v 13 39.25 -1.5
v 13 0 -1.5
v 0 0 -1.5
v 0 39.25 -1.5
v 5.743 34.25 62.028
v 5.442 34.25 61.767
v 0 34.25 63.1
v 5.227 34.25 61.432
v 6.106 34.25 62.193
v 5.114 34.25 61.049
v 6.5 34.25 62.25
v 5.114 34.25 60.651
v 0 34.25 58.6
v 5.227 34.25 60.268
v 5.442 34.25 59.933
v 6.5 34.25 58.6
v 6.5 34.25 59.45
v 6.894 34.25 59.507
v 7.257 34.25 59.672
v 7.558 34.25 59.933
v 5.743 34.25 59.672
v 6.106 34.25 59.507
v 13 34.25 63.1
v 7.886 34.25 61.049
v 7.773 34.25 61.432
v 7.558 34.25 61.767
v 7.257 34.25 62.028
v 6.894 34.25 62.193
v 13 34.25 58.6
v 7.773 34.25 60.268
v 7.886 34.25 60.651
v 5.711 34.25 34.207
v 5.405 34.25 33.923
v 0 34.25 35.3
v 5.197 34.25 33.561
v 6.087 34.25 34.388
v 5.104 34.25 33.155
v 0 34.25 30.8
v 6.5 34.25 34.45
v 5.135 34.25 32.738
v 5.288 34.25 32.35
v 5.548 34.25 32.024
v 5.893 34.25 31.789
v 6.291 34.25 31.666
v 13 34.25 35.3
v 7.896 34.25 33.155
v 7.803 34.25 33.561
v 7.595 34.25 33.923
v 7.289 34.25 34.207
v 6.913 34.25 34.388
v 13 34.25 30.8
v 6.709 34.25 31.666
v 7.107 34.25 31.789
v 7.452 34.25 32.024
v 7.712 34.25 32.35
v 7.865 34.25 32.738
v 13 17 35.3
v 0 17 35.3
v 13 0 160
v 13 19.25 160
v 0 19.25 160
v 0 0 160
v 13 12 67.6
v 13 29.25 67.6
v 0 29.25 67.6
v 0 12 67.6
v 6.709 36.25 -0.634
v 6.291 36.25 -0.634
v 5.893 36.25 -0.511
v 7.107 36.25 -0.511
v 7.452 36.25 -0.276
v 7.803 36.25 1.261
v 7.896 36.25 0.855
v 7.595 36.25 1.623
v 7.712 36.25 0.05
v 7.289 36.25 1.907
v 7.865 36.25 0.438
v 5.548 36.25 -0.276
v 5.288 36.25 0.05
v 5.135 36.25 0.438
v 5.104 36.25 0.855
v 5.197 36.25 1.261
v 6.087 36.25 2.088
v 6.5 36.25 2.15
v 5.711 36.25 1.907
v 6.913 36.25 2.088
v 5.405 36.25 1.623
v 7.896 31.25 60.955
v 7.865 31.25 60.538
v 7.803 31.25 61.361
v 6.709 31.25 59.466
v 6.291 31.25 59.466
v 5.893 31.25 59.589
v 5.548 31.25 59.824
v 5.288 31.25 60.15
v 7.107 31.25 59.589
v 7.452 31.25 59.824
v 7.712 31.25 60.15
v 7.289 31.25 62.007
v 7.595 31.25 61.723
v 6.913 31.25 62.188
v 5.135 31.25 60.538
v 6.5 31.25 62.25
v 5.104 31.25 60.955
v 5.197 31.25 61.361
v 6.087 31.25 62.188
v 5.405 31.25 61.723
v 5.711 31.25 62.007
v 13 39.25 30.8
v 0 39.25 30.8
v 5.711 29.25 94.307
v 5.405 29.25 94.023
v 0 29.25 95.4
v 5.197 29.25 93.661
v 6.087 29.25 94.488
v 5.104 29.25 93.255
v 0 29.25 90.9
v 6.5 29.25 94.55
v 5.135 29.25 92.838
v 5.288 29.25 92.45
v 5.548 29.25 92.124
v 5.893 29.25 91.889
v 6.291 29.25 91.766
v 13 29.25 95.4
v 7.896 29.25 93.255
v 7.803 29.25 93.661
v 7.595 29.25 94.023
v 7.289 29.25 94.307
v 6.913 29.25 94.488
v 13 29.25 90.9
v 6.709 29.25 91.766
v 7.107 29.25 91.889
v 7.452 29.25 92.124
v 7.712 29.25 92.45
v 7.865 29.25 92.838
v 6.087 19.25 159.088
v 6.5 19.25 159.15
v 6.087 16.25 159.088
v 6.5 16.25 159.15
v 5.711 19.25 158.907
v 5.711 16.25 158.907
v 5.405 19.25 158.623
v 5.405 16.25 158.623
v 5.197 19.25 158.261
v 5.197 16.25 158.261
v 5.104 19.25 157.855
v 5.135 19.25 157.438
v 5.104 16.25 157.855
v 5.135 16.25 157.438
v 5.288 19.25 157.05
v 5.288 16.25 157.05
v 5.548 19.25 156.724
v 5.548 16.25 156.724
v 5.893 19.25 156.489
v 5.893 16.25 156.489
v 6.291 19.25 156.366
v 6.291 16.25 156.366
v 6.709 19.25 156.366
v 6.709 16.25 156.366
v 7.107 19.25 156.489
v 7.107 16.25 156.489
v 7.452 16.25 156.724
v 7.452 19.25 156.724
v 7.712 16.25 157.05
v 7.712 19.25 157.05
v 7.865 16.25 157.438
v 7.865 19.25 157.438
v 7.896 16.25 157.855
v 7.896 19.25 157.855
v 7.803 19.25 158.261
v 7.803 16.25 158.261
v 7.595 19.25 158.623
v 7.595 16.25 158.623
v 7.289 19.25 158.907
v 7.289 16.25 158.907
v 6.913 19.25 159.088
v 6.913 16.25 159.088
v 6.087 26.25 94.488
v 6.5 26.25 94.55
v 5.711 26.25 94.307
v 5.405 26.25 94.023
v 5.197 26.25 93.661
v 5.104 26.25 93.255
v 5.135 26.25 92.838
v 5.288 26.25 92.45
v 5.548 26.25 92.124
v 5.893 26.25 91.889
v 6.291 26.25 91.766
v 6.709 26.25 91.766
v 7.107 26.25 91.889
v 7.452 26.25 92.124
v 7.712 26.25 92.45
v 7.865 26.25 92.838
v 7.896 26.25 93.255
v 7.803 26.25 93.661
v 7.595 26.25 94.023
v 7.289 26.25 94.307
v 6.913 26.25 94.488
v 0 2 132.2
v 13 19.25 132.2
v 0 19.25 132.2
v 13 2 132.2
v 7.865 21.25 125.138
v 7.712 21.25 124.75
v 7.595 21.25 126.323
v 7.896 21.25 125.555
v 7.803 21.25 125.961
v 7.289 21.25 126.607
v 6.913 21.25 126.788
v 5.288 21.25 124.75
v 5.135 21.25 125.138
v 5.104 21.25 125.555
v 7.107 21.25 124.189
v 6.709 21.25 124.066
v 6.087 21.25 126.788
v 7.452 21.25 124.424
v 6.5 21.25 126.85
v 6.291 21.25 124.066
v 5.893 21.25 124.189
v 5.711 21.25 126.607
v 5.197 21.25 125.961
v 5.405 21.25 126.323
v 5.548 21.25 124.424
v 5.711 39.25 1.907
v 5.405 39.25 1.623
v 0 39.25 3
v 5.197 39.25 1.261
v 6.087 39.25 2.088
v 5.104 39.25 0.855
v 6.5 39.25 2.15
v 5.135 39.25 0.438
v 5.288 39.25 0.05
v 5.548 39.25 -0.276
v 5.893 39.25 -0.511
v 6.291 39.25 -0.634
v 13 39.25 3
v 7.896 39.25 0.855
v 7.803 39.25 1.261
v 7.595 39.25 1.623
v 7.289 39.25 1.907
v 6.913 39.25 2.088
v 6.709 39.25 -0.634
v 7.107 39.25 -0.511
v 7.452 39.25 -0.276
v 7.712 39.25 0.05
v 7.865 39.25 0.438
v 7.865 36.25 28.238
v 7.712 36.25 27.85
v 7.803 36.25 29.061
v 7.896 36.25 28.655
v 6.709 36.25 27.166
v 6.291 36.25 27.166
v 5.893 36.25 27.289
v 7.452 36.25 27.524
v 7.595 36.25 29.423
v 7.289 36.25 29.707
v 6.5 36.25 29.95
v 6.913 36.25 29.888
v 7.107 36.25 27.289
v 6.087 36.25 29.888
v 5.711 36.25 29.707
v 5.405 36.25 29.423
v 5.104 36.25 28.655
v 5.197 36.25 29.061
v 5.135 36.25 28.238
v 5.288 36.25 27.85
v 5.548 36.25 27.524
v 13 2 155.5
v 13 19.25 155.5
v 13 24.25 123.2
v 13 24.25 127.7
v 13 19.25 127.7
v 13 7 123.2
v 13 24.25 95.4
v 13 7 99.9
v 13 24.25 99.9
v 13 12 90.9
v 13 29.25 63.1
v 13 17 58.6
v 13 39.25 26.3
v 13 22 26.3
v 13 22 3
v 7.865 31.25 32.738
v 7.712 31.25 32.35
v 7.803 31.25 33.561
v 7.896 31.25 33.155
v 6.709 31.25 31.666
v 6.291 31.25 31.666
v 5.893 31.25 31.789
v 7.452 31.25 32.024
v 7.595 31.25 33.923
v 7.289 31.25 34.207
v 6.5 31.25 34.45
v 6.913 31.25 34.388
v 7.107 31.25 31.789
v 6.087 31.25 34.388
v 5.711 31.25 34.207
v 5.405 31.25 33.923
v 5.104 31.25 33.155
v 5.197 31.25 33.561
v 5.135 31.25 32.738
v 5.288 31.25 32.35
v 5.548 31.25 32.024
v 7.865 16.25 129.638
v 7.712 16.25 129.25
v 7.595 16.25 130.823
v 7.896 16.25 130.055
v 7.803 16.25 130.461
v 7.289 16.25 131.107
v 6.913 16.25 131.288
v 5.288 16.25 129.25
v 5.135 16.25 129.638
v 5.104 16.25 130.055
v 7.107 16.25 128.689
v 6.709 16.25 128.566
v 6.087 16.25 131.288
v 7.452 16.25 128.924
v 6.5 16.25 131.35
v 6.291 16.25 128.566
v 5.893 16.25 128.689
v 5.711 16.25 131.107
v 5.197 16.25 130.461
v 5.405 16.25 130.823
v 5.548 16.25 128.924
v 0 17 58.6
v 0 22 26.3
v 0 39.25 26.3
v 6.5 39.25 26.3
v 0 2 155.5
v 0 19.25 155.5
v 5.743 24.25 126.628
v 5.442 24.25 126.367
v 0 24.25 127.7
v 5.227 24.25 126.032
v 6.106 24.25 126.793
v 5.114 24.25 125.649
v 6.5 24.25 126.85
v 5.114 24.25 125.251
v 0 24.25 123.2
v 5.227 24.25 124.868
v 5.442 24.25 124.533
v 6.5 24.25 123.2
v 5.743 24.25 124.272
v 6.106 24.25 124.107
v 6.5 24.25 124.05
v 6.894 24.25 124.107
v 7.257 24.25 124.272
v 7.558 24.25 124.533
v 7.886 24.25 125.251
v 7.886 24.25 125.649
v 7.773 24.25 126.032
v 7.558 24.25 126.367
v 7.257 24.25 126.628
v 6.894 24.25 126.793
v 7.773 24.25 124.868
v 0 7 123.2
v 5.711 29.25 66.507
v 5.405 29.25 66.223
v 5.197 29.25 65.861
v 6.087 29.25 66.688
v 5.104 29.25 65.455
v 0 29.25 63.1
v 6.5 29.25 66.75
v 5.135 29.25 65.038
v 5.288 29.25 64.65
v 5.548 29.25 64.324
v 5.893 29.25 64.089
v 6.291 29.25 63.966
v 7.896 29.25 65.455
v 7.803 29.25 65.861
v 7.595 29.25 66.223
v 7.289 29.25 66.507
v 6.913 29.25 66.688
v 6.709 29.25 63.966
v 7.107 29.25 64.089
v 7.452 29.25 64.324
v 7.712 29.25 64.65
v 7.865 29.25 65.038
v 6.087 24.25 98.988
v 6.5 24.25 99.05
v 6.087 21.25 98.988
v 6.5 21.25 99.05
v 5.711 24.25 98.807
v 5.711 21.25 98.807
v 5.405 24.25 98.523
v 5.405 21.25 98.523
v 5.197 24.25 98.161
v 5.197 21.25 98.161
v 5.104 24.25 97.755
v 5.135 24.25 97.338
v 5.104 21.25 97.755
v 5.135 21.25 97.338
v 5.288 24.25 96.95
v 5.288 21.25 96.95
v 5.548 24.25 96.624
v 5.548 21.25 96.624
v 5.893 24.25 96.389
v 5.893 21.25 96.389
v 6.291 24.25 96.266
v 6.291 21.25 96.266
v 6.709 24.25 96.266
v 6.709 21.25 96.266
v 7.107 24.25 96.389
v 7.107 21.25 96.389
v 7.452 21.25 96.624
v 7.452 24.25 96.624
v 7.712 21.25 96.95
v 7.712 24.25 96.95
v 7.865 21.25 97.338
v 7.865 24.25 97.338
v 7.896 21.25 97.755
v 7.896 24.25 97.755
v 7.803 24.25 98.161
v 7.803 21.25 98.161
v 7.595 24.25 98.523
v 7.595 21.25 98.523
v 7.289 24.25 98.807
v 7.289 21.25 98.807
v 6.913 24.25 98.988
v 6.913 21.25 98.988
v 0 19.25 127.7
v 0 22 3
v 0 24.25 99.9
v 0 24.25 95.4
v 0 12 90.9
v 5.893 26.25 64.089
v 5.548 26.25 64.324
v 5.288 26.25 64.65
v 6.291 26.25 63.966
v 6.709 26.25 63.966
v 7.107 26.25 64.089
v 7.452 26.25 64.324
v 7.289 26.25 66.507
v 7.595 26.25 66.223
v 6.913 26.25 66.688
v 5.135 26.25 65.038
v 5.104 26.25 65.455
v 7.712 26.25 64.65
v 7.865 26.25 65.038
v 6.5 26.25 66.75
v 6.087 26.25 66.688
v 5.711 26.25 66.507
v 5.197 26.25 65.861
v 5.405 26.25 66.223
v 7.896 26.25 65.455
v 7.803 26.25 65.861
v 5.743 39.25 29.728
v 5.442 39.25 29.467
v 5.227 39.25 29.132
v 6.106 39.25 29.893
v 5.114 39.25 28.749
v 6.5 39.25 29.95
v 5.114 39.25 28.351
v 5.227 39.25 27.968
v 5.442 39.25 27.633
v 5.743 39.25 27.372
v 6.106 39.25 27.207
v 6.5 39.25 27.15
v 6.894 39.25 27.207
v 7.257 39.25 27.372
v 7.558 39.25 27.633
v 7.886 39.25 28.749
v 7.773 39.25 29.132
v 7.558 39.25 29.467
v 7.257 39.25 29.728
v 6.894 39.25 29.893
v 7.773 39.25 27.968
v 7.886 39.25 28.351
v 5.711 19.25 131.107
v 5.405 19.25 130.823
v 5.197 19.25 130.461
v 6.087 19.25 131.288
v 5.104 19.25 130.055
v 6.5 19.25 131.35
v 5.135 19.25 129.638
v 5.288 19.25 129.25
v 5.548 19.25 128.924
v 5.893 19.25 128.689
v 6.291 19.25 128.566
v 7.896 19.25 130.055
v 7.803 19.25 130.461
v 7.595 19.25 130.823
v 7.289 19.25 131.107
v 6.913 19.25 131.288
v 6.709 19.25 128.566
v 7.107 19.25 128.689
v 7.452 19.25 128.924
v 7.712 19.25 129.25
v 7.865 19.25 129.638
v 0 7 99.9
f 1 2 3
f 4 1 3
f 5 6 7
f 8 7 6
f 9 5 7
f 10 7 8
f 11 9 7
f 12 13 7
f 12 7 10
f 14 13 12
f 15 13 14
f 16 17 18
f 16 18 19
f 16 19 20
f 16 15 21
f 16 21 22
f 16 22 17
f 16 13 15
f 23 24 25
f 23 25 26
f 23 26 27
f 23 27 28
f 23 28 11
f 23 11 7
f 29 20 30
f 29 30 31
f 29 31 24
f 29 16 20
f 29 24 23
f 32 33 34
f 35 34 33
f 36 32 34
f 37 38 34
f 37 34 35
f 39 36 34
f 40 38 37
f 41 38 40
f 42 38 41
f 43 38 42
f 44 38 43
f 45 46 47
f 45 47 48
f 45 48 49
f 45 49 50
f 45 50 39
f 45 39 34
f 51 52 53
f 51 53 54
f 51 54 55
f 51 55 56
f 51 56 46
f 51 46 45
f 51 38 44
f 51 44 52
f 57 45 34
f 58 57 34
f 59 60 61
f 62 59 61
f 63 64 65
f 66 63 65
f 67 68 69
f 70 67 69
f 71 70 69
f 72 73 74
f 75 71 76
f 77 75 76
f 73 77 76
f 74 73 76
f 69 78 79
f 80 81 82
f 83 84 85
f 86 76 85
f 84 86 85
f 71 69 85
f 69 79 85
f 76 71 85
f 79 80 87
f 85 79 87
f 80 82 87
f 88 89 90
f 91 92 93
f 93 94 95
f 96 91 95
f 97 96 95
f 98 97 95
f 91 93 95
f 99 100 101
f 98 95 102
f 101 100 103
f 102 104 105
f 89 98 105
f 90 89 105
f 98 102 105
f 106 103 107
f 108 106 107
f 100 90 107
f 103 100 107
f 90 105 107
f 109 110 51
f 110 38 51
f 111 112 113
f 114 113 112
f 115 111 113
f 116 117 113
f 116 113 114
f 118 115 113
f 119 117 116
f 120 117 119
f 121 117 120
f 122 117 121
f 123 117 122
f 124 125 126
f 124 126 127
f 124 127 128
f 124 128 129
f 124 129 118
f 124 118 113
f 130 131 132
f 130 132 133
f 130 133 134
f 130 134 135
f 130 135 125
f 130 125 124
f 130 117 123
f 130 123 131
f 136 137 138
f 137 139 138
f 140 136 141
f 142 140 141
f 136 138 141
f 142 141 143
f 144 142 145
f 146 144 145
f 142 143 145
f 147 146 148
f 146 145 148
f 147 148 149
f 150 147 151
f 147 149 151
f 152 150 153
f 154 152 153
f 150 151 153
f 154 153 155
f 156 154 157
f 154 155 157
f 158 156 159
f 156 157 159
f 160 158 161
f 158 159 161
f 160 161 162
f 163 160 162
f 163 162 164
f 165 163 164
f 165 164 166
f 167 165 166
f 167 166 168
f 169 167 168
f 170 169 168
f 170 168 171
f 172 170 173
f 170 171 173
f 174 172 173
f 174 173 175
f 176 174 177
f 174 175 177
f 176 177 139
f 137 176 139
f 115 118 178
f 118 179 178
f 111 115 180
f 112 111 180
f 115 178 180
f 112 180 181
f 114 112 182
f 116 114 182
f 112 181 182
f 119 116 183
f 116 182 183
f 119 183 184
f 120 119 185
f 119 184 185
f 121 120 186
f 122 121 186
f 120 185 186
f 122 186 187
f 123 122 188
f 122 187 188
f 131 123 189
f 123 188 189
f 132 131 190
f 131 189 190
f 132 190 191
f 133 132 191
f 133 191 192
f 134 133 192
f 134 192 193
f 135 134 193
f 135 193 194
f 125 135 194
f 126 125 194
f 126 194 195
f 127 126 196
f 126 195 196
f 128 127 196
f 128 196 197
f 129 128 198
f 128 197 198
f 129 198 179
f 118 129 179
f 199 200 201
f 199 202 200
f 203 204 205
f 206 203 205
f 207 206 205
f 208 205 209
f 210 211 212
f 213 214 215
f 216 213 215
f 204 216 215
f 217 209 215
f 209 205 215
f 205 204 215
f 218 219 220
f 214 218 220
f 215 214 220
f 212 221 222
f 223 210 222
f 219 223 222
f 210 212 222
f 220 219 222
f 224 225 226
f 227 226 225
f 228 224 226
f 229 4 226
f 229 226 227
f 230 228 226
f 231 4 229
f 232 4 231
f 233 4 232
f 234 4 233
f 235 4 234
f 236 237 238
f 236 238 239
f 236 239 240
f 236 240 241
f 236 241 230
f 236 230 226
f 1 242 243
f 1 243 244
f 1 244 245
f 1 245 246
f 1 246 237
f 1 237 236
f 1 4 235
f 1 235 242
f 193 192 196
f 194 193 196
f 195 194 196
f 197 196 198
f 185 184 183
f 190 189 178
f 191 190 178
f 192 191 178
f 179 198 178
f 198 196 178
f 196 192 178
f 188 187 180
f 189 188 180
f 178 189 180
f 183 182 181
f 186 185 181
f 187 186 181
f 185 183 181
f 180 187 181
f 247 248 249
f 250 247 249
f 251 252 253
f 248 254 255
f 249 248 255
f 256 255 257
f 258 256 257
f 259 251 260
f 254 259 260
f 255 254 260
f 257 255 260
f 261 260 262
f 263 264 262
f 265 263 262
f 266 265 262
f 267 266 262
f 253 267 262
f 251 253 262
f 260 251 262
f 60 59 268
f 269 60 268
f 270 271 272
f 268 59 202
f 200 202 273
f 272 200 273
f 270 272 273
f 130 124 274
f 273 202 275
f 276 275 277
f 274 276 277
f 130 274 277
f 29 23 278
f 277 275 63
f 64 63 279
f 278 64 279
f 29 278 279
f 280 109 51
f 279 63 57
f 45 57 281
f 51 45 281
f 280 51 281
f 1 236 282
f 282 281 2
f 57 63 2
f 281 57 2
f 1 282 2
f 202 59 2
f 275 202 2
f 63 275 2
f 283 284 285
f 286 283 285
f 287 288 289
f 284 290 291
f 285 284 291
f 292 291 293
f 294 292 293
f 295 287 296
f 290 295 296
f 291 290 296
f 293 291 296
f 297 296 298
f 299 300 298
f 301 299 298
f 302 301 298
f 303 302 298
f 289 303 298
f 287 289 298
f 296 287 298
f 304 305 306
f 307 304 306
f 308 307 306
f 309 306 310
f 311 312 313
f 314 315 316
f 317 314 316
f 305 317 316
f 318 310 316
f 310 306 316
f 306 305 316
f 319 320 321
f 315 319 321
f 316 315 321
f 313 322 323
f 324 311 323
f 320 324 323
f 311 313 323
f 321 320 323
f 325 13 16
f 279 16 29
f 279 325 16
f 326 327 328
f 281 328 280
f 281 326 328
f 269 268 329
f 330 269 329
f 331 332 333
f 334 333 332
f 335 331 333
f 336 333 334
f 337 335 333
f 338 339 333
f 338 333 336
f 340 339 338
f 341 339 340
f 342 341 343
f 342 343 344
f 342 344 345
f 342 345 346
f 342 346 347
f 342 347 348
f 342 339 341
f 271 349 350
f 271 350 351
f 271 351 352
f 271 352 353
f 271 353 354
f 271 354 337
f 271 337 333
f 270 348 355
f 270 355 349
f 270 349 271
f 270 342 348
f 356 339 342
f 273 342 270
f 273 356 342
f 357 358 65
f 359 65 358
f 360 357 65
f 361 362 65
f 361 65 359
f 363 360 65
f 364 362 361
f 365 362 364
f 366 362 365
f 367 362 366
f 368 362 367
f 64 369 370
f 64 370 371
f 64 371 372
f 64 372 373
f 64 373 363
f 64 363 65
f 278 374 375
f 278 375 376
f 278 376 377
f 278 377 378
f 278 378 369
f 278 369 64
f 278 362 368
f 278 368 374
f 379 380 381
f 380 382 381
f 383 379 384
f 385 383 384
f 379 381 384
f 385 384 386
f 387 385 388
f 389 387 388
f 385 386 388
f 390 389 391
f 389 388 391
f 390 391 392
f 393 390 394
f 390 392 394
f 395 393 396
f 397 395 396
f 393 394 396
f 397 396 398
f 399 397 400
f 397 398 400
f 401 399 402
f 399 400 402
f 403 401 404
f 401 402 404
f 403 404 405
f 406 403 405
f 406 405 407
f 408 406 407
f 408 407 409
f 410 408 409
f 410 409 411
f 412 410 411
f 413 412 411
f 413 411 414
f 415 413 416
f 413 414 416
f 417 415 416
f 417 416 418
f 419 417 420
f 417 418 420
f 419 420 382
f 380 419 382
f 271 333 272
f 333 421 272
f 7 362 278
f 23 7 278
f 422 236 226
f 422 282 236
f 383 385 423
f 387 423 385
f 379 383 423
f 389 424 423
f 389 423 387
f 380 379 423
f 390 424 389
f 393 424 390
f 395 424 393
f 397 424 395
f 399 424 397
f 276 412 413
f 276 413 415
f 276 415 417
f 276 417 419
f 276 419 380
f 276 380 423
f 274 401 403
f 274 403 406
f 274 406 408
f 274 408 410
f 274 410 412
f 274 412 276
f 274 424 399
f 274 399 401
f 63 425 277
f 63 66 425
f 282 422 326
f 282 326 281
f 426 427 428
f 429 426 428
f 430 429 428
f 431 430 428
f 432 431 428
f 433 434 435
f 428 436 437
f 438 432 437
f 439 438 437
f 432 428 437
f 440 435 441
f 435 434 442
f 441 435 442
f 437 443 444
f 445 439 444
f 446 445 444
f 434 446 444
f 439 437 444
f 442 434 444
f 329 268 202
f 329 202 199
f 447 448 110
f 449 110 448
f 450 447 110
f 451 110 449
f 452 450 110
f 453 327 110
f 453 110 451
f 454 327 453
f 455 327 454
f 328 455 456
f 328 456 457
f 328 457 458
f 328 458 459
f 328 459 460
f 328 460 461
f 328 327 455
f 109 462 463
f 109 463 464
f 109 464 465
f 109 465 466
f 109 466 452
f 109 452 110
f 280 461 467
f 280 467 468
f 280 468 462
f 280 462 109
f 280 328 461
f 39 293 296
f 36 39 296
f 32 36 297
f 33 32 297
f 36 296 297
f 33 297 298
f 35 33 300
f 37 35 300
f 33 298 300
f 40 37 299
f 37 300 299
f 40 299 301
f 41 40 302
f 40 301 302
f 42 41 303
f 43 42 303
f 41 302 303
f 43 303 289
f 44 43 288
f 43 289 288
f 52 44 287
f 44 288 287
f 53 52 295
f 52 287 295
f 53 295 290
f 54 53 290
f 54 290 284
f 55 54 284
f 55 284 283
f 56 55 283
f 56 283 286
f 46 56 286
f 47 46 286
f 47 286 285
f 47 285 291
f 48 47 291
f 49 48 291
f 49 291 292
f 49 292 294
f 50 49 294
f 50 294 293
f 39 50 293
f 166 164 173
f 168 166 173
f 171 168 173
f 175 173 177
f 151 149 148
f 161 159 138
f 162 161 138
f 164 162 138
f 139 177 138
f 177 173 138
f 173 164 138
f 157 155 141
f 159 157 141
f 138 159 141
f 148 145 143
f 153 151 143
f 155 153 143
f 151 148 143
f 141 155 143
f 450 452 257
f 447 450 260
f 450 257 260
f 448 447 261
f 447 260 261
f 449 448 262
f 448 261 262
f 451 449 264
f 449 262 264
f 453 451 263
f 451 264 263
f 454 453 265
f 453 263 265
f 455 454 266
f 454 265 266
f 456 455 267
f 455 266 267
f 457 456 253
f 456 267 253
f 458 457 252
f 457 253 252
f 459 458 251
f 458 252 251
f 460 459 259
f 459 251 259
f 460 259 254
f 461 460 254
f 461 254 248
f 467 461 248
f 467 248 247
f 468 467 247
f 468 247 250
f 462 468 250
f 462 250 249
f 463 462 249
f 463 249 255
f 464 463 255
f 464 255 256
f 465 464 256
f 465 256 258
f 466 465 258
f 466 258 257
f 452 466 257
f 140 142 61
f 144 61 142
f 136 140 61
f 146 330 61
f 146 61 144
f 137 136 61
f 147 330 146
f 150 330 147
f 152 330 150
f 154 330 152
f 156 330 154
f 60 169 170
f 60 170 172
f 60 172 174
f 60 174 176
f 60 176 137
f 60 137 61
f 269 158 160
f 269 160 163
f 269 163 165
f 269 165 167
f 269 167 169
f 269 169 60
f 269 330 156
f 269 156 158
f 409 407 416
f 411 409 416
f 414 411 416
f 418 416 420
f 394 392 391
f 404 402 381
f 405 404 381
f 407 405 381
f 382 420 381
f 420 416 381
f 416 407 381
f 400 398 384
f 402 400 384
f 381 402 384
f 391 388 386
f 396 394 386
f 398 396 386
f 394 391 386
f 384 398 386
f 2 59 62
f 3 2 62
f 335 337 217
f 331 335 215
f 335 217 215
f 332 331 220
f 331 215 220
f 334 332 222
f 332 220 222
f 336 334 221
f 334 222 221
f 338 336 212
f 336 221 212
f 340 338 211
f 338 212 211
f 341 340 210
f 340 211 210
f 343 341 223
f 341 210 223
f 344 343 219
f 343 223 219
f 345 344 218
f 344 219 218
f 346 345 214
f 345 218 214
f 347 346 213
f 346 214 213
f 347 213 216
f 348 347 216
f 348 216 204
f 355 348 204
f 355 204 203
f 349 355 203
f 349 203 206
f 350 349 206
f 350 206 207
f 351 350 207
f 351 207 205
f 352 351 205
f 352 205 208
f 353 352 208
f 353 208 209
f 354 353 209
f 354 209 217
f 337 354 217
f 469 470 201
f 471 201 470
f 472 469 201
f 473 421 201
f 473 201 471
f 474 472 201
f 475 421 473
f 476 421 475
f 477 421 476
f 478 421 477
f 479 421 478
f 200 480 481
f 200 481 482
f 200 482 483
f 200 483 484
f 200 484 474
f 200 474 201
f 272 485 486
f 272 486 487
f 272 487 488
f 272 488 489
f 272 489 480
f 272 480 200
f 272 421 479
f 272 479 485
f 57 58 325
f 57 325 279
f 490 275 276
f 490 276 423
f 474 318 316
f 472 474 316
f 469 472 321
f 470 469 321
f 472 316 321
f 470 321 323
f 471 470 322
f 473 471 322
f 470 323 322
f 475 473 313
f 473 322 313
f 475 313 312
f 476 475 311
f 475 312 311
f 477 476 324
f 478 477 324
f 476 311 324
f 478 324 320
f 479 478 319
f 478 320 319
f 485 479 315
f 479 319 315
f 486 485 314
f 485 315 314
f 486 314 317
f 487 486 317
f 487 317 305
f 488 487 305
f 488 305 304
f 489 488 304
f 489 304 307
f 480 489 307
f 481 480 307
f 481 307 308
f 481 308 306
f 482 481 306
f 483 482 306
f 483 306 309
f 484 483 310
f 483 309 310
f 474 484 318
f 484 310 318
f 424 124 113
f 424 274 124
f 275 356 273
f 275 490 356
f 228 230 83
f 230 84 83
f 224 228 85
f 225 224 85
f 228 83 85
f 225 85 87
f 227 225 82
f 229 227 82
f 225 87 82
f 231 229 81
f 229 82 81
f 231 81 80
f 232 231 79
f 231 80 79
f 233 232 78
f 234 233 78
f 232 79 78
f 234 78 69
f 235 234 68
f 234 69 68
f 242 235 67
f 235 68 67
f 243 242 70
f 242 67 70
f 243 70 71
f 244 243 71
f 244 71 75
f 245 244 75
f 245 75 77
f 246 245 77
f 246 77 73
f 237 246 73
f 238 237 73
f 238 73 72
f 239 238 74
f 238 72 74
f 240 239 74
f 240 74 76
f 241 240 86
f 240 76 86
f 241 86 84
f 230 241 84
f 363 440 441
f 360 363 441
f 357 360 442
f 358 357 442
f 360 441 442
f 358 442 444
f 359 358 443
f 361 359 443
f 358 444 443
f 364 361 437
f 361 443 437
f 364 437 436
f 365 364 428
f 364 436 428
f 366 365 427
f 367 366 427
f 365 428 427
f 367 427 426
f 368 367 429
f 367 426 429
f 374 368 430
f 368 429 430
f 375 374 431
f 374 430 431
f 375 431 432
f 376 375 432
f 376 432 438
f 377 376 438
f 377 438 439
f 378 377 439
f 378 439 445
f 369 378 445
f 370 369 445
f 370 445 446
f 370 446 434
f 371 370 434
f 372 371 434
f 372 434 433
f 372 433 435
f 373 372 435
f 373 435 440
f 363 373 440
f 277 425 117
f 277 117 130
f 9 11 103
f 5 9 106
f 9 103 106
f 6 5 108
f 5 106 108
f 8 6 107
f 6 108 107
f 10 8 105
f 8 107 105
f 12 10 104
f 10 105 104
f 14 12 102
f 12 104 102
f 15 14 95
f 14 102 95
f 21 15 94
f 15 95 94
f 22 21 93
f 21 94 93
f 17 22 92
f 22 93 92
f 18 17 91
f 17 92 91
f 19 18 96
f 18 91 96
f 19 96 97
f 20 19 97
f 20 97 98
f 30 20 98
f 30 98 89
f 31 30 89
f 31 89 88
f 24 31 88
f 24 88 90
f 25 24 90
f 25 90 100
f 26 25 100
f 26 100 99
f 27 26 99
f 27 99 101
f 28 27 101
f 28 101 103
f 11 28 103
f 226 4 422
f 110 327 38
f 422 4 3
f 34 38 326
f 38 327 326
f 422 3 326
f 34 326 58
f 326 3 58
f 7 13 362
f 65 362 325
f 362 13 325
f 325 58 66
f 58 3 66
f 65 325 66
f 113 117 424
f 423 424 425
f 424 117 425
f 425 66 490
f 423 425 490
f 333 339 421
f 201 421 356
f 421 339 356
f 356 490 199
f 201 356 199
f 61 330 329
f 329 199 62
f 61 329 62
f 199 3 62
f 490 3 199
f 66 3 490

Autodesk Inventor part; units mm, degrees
ref_plane "YZ Plane" through (0, 0, 0) normal (1, 0, 0) x (0, 1, 0)
ref_plane "XZ Plane" through (0, 0, 0) normal (0, 1, 0) x (-1, 0, 0)
sketch "Sketch15" plane through (0, 0, 0) normal (0, 1, 0) x (-1, 0, 0)
  line L0 (0, 0) -> (-13, 0)
  line L1 (-13, 0) -> (-13, 160)
  line L2 (-13, 160) -> (0, 160)
  line L3 (0, 160) -> (0, 0)
  line L4 (-13, 0) -> (-13, -1.5)
  line L5 (-13, -1.5) -> (0, -1.5)
  line L6 (0, -1.5) -> (0, 0)
  dimension "d75" = 13
  dimension "d76" = 160
  dimension "d127" = 1.5
extrude "Extrusion15" add sketch "Sketch15" along normal blind 2
sketch "Sketch16" plane through (0, 2, 0) normal (0, 1, 0) x (1, 0, 0)
  line L0 (0, 0) -> (0, -160) projected
  line L1 (13, -160) -> (13, 1.5) projected
  line L2 (0, -160) -> (13, -160)
  line L3 (13, -160) -> (13, -155.5)
  line L4 (13, -155.5) -> (0, -155.5)
  line L5 (0, -155.5) -> (0, -160)
  circle A0 centre (6.5, -157.75) radius 1.4
  circle A1 centre (6.5, -129.95) radius 1.4
  line L6 (13, -127.7) -> (13, -132.2)
  line L7 (13, -132.2) -> (0, -132.2)
  line L8 (0, -127.7) -> (13, -127.7)
  line L9 (0, -127.7) -> (0, -132.2)
  point P0 (20, 0)
  point P1 (13, -160)
  point P2 (0, -155.5)
  point P3 (13, 1.5)
extrude "Extrusion16" add sketch "Sketch16" along normal blind 17.25 contours L8 L1 L7 L0 | L4 L1 L2 L0 | A0 | A1
sketch "Sketch20" plane through (0, 2, 0) normal (0, 1, 0) x (1, 0, 0)
  line L0 (0, -127.7) -> (13, -127.7) projected
  line L1 (0, -127.7) -> (0, -123.2)
  line L2 (0, 0) -> (0, -127.7) projected
  line L3 (0, -123.2) -> (13, -123.2)
  line L4 (13, -127.7) -> (13, 1.5) projected
  line L5 (13, -127.7) -> (13, -123.2)
  line L6 (13, -132.2) -> (13, -127.7) projected
  line L7 (13, -127.7) -> (0, -127.7)
  circle A0 centre (6.5, -125.45) radius 1.4
  circle A1 centre (6.5, -97.65) radius 1.4
  line L8 (10, -95.4) -> (13, -95.4)
  line L9 (13, -95.4) -> (13, -99.9)
  line L10 (13, -99.9) -> (0, -99.9)
  line L11 (0, -95.4) -> (10, -95.4)
  line L12 (0, -95.4) -> (0, -99.9)
  line L13 (6.5, -123.2) -> (6.5, -125.45)
  point P0 (20, 0)
  point P1 (13, 1.5)
  dimension "d95" = 4.5
  dimension "d96" = 2.8
extrude "Extrusion20" add sketch "Sketch20" along normal blind 22.25 contours A0 | L1 L3 L4 L0 | L2 L11 L8 L4 L10 | A1
sketch "Sketch21" plane through (0, 2, 0) normal (0, 1, 0) x (1, 0, 0)
  line L0 (13, -95.4) -> (0, -95.4) projected
  line L1 (0, -95.4) -> (0, -90.9)
  line L2 (0, 0) -> (0, -160) projected
  line L3 (13, -160) -> (13, 1.5) projected
  line L4 (0, -95.4) -> (13, -95.4)
  circle A0 centre (6.5, -93.15) radius 1.4
  circle A1 centre (6.5, -65.35) radius 1.4
  line L5 (10, -63.1) -> (13, -63.1)
  line L6 (13, -63.1) -> (13, -67.6)
  line L7 (13, -67.6) -> (0, -67.6)
  line L8 (0, -67.6) -> (0, -63.1)
  line L9 (0, -63.1) -> (10, -63.1)
  line L10 (13, -95.4) -> (13, -90.9)
  line L11 (0, -90.9) -> (13, -90.9)
  point P0 (20, -90.9)
  point P1 (20, 0)
  point P2 (13, 1.5)
  dimension "d102" = 4.5
extrude "Extrusion21" add sketch "Sketch21" along normal blind 27.25 contours L0 L1 L11 L3 | L7 L2 L9 L5 L3 | A0 | A1
sketch "Sketch22" plane through (0, 2, 0) normal (0, 1, 0) x (1, 0, 0)
  line L0 (0, -63.1) -> (13, -63.1) projected
  line L1 (0, -63.1) -> (0, -58.6)
  line L2 (0, 0) -> (0, -160) projected
  line L3 (0, -58.6) -> (13, -58.6)
  line L4 (13, -160) -> (13, 1.5) projected
  line L5 (13, -58.6) -> (13, -63.1)
  line L6 (13, -63.1) -> (0, -63.1)
  circle A0 centre (6.5, -60.85) radius 1.4
  circle A1 centre (6.5, -33.05) radius 1.4
  line L7 (10, -30.8) -> (13, -30.8)
  line L8 (13, -30.8) -> (13, -35.3)
  line L9 (13, -35.3) -> (0, -35.3)
  line L10 (0, -30.8) -> (0, -35.3)
  line L11 (0, -30.8) -> (10, -30.8)
  line L12 (6.5, -58.6) -> (6.5, -60.85)
  point P0 (20, 0)
  point P1 (13, 1.5)
  dimension "d110" = 4.5
  dimension "d111" = 2.8
extrude "Extrusion22" add sketch "Sketch22" along normal blind 32.25 contours A0 | L1 L3 L4 L0 | L2 L11 L7 L4 L9 | A1
sketch "Sketch23" plane through (0, 2, 0) normal (0, 1, 0) x (1, 0, 0)
  line L0 (0, -30.8) -> (13, -30.8) projected
  line L1 (0, -30.8) -> (0, -26.3)
  line L2 (0, 0) -> (0, -160) projected
  line L3 (0, -26.3) -> (13, -26.3)
  line L4 (13, -160) -> (13, 1.5) projected
  line L5 (13, -26.3) -> (13, -30.8)
  line L6 (13, -30.8) -> (0, -30.8)
  circle A0 centre (6.5, -28.55) radius 1.4
  circle A1 centre (6.5, -0.75) radius 1.4
  line L7 (20, 0) -> (0, 0) projected
  line L8 (3, 1.5) -> (13, 1.5)
  line L9 (13, 1.5) -> (13, -3)
  line L10 (13, -3) -> (0, -3)
  line L11 (0, -3) -> (0, 1.5)
  line L12 (0, 1.5) -> (3, 1.5)
  line L13 (6.5, -26.3) -> (6.5, -28.55)
  dimension "d118" = 4.5
  dimension "d119" = 2.8
  dimension "d124" = 4.5
extrude "Extrusion23" add sketch "Sketch23" along normal blind 37.25 contours A0 | L1 L3 L4 L0 | L2 L7 A1 L4 L10 | L11 L12 L8 L4 L7 A1 | L7 A1 | A1 L7
sketch "Sketch27" plane through (0, 2, 0) normal (0, 1, 0) x (1, 0, 0)
  line L0 (0, -123.2) -> (13, -123.2) projected
  line L1 (0, -99.9) -> (13, -99.9) projected
  line L2 (0, -123.2) -> (13, -123.2)
  line L3 (13, -123.2) -> (13, -99.9)
  line L4 (13, -99.9) -> (0, -99.9)
  line L5 (0, -99.9) -> (0, -123.2)
  point P0 (0, 0)
extrude "Extrusion27" add sketch "Sketch27" along normal blind 5
sketch "Sketch28" plane through (0, 2, 0) normal (0, 1, 0) x (1, 0, 0)
  line L0 (13, -90.9) -> (13, -67.6) projected
  line L1 (0, -67.6) -> (0, -90.9) projected
  line L2 (13, -90.9) -> (0, -90.9)
  line L3 (0, -90.9) -> (0, -67.6)
  line L4 (0, -67.6) -> (13, -67.6)
  line L5 (13, -67.6) -> (13, -90.9)
  point P0 (0, 0)
extrude "Extrusion28" add sketch "Sketch28" along normal blind 10
sketch "Sketch29" plane through (0, 2, 0) normal (0, 1, 0) x (1, 0, 0)
  line L0 (13, -58.6) -> (0, -58.6) projected
  line L1 (0, -58.6) -> (13, -58.6)
  line L2 (13, -58.6) -> (13, -35.3)
  line L3 (13, -35.3) -> (0, -35.3)
  line L4 (0, -35.3) -> (0, -58.6)
  point P0 (0, 0)
extrude "Extrusion29" add sketch "Sketch29" along normal blind 15
sketch "Sketch30" plane through (0, 2, 0) normal (0, 1, 0) x (1, 0, 0)
  line L0 (0, -26.3) -> (13, -26.3) projected
  line L1 (0, -3) -> (13, -3) projected
  line L2 (0, -26.3) -> (13, -26.3)
  line L3 (13, -26.3) -> (13, -3)
  line L4 (13, -3) -> (0, -3)
  line L5 (0, -3) -> (0, -26.3)
  point P0 (0, 0)
extrude "Extrusion30" add sketch "Sketch30" along normal blind 20
ref_plane "Work Plane1" through (0, 0, -1.5) normal (0, 0, 1) x (1, 0, 0)
ref_plane "Work Plane4" through (0, 0, 30.8) normal (0, 0, 1) x (1, 0, 0)
ref_plane "Work Plane3" through (0, 0, 95.4) normal (0, 0, 1) x (1, 0, 0)
sketch "Sketch35" plane through (0, 19.25, 0) normal (0, 1, 0) x (1, 0, 0)
  line L0 (0, -160) -> (13, -160) projected
  line L1 (6.5, -160) -> (6.5, -157.75)
  line L2 (6.5, -157.75) -> (6.5, -129.95)
  point P0 (0, 0)
  dimension "d168" = 2.25
  dimension "d169" = 27.8
hole "Hole1" at (6.5, 19.25, 129.95) at (6.5, 19.25, 157.75) direction (0, -1, 0) diameter 2.8 depth 3
sketch "Sketch36" plane through (0, 24.25, 0) normal (0, 1, 0) x (1, 0, 0)
  line L0 (0, -127.7) -> (13, -127.7) projected
  line L1 (6.5, -127.7) -> (6.5, -125.45)
  line L2 (6.5, -125.45) -> (6.5, -97.65)
  point P0 (0, 0)
hole "Hole2" at (6.5, 24.25, 125.45) at (6.5, 24.25, 97.65) direction (0, -1, 0) diameter 2.8 depth 3
sketch "Sketch37" plane through (0, 29.25, 0) normal (0, 1, 0) x (1, 0, 0)
  line L0 (0, -95.4) -> (13, -95.4) projected
  line L1 (6.5, -95.4) -> (6.5, -93.15)
  line L2 (6.5, -93.15) -> (6.5, -65.35)
  point P0 (0, 0)
hole "Hole3" at (6.5, 29.25, 93.15) at (6.5, 29.25, 65.35) direction (0, -1, 0) diameter 2.8 depth 3
sketch "Sketch38" plane through (0, 34.25, 0) normal (0, 1, 0) x (1, 0, 0)
  line L0 (0, -63.1) -> (13, -63.1) projected
  line L1 (6.5, -63.1) -> (6.5, -60.85)
  line L2 (6.5, -60.85) -> (6.5, -33.05)
  point P0 (0, 0)
  dimension "d195" = 2.25
  dimension "d196" = 27.8
hole "Hole4" at (6.5, 34.25, 60.85) at (6.5, 34.25, 33.05) direction (0, -1, 0) diameter 2.8 depth 3
sketch "Sketch39" plane through (0, 39.25, 0) normal (0, 1, 0) x (1, 0, 0)
  line L0 (13, -30.8) -> (0, -30.8) projected
  line L1 (6.5, -30.8) -> (6.5, -28.55)
  line L2 (6.5, -28.55) -> (6.5, -0.75)
  point P0 (0, 0)
  dimension "d204" = 2.25
  dimension "d205" = 27.8
hole "Hole5" at (6.5, 39.25, 28.55) at (6.5, 39.25, 0.75) direction (0, -1, 0) diameter 2.8 depth 3
thread "Thread1" size "M3x0.5" class "6H" standard "ANSI Metric M Profile" length 6
thread "Thread2" size "M3x0.5" class "6H" standard "ANSI Metric M Profile" length 6
thread "Thread3" size "M3x0.5" class "6H" standard "ANSI Metric M Profile" length 6
thread "Thread4" size "M3x0.5" class "6H" standard "ANSI Metric M Profile" length 6
thread "Thread5" size "M3x0.5" class "6H" standard "ANSI Metric M Profile" length 6
thread "Thread6" size "M3x0.5" class "6H" standard "ANSI Metric M Profile" length 6
thread "Thread7" size "M3x0.5" class "6H" standard "ANSI Metric M Profile" length 6
thread "Thread8" size "M3x0.5" class "6H" standard "ANSI Metric M Profile" length 6
thread "Thread9" size "M3x0.5" class "6H" standard "ANSI Metric M Profile" length 6
thread "Thread10" size "M3x0.5" class "6H" standard "ANSI Metric M Profile" length 6
ref_plane "Work Plane2" through (0, 0, 160) normal (0, 0, 1) x (1, 0, 0)
properties part number "Forearm_1" material "ABS Plastic"
